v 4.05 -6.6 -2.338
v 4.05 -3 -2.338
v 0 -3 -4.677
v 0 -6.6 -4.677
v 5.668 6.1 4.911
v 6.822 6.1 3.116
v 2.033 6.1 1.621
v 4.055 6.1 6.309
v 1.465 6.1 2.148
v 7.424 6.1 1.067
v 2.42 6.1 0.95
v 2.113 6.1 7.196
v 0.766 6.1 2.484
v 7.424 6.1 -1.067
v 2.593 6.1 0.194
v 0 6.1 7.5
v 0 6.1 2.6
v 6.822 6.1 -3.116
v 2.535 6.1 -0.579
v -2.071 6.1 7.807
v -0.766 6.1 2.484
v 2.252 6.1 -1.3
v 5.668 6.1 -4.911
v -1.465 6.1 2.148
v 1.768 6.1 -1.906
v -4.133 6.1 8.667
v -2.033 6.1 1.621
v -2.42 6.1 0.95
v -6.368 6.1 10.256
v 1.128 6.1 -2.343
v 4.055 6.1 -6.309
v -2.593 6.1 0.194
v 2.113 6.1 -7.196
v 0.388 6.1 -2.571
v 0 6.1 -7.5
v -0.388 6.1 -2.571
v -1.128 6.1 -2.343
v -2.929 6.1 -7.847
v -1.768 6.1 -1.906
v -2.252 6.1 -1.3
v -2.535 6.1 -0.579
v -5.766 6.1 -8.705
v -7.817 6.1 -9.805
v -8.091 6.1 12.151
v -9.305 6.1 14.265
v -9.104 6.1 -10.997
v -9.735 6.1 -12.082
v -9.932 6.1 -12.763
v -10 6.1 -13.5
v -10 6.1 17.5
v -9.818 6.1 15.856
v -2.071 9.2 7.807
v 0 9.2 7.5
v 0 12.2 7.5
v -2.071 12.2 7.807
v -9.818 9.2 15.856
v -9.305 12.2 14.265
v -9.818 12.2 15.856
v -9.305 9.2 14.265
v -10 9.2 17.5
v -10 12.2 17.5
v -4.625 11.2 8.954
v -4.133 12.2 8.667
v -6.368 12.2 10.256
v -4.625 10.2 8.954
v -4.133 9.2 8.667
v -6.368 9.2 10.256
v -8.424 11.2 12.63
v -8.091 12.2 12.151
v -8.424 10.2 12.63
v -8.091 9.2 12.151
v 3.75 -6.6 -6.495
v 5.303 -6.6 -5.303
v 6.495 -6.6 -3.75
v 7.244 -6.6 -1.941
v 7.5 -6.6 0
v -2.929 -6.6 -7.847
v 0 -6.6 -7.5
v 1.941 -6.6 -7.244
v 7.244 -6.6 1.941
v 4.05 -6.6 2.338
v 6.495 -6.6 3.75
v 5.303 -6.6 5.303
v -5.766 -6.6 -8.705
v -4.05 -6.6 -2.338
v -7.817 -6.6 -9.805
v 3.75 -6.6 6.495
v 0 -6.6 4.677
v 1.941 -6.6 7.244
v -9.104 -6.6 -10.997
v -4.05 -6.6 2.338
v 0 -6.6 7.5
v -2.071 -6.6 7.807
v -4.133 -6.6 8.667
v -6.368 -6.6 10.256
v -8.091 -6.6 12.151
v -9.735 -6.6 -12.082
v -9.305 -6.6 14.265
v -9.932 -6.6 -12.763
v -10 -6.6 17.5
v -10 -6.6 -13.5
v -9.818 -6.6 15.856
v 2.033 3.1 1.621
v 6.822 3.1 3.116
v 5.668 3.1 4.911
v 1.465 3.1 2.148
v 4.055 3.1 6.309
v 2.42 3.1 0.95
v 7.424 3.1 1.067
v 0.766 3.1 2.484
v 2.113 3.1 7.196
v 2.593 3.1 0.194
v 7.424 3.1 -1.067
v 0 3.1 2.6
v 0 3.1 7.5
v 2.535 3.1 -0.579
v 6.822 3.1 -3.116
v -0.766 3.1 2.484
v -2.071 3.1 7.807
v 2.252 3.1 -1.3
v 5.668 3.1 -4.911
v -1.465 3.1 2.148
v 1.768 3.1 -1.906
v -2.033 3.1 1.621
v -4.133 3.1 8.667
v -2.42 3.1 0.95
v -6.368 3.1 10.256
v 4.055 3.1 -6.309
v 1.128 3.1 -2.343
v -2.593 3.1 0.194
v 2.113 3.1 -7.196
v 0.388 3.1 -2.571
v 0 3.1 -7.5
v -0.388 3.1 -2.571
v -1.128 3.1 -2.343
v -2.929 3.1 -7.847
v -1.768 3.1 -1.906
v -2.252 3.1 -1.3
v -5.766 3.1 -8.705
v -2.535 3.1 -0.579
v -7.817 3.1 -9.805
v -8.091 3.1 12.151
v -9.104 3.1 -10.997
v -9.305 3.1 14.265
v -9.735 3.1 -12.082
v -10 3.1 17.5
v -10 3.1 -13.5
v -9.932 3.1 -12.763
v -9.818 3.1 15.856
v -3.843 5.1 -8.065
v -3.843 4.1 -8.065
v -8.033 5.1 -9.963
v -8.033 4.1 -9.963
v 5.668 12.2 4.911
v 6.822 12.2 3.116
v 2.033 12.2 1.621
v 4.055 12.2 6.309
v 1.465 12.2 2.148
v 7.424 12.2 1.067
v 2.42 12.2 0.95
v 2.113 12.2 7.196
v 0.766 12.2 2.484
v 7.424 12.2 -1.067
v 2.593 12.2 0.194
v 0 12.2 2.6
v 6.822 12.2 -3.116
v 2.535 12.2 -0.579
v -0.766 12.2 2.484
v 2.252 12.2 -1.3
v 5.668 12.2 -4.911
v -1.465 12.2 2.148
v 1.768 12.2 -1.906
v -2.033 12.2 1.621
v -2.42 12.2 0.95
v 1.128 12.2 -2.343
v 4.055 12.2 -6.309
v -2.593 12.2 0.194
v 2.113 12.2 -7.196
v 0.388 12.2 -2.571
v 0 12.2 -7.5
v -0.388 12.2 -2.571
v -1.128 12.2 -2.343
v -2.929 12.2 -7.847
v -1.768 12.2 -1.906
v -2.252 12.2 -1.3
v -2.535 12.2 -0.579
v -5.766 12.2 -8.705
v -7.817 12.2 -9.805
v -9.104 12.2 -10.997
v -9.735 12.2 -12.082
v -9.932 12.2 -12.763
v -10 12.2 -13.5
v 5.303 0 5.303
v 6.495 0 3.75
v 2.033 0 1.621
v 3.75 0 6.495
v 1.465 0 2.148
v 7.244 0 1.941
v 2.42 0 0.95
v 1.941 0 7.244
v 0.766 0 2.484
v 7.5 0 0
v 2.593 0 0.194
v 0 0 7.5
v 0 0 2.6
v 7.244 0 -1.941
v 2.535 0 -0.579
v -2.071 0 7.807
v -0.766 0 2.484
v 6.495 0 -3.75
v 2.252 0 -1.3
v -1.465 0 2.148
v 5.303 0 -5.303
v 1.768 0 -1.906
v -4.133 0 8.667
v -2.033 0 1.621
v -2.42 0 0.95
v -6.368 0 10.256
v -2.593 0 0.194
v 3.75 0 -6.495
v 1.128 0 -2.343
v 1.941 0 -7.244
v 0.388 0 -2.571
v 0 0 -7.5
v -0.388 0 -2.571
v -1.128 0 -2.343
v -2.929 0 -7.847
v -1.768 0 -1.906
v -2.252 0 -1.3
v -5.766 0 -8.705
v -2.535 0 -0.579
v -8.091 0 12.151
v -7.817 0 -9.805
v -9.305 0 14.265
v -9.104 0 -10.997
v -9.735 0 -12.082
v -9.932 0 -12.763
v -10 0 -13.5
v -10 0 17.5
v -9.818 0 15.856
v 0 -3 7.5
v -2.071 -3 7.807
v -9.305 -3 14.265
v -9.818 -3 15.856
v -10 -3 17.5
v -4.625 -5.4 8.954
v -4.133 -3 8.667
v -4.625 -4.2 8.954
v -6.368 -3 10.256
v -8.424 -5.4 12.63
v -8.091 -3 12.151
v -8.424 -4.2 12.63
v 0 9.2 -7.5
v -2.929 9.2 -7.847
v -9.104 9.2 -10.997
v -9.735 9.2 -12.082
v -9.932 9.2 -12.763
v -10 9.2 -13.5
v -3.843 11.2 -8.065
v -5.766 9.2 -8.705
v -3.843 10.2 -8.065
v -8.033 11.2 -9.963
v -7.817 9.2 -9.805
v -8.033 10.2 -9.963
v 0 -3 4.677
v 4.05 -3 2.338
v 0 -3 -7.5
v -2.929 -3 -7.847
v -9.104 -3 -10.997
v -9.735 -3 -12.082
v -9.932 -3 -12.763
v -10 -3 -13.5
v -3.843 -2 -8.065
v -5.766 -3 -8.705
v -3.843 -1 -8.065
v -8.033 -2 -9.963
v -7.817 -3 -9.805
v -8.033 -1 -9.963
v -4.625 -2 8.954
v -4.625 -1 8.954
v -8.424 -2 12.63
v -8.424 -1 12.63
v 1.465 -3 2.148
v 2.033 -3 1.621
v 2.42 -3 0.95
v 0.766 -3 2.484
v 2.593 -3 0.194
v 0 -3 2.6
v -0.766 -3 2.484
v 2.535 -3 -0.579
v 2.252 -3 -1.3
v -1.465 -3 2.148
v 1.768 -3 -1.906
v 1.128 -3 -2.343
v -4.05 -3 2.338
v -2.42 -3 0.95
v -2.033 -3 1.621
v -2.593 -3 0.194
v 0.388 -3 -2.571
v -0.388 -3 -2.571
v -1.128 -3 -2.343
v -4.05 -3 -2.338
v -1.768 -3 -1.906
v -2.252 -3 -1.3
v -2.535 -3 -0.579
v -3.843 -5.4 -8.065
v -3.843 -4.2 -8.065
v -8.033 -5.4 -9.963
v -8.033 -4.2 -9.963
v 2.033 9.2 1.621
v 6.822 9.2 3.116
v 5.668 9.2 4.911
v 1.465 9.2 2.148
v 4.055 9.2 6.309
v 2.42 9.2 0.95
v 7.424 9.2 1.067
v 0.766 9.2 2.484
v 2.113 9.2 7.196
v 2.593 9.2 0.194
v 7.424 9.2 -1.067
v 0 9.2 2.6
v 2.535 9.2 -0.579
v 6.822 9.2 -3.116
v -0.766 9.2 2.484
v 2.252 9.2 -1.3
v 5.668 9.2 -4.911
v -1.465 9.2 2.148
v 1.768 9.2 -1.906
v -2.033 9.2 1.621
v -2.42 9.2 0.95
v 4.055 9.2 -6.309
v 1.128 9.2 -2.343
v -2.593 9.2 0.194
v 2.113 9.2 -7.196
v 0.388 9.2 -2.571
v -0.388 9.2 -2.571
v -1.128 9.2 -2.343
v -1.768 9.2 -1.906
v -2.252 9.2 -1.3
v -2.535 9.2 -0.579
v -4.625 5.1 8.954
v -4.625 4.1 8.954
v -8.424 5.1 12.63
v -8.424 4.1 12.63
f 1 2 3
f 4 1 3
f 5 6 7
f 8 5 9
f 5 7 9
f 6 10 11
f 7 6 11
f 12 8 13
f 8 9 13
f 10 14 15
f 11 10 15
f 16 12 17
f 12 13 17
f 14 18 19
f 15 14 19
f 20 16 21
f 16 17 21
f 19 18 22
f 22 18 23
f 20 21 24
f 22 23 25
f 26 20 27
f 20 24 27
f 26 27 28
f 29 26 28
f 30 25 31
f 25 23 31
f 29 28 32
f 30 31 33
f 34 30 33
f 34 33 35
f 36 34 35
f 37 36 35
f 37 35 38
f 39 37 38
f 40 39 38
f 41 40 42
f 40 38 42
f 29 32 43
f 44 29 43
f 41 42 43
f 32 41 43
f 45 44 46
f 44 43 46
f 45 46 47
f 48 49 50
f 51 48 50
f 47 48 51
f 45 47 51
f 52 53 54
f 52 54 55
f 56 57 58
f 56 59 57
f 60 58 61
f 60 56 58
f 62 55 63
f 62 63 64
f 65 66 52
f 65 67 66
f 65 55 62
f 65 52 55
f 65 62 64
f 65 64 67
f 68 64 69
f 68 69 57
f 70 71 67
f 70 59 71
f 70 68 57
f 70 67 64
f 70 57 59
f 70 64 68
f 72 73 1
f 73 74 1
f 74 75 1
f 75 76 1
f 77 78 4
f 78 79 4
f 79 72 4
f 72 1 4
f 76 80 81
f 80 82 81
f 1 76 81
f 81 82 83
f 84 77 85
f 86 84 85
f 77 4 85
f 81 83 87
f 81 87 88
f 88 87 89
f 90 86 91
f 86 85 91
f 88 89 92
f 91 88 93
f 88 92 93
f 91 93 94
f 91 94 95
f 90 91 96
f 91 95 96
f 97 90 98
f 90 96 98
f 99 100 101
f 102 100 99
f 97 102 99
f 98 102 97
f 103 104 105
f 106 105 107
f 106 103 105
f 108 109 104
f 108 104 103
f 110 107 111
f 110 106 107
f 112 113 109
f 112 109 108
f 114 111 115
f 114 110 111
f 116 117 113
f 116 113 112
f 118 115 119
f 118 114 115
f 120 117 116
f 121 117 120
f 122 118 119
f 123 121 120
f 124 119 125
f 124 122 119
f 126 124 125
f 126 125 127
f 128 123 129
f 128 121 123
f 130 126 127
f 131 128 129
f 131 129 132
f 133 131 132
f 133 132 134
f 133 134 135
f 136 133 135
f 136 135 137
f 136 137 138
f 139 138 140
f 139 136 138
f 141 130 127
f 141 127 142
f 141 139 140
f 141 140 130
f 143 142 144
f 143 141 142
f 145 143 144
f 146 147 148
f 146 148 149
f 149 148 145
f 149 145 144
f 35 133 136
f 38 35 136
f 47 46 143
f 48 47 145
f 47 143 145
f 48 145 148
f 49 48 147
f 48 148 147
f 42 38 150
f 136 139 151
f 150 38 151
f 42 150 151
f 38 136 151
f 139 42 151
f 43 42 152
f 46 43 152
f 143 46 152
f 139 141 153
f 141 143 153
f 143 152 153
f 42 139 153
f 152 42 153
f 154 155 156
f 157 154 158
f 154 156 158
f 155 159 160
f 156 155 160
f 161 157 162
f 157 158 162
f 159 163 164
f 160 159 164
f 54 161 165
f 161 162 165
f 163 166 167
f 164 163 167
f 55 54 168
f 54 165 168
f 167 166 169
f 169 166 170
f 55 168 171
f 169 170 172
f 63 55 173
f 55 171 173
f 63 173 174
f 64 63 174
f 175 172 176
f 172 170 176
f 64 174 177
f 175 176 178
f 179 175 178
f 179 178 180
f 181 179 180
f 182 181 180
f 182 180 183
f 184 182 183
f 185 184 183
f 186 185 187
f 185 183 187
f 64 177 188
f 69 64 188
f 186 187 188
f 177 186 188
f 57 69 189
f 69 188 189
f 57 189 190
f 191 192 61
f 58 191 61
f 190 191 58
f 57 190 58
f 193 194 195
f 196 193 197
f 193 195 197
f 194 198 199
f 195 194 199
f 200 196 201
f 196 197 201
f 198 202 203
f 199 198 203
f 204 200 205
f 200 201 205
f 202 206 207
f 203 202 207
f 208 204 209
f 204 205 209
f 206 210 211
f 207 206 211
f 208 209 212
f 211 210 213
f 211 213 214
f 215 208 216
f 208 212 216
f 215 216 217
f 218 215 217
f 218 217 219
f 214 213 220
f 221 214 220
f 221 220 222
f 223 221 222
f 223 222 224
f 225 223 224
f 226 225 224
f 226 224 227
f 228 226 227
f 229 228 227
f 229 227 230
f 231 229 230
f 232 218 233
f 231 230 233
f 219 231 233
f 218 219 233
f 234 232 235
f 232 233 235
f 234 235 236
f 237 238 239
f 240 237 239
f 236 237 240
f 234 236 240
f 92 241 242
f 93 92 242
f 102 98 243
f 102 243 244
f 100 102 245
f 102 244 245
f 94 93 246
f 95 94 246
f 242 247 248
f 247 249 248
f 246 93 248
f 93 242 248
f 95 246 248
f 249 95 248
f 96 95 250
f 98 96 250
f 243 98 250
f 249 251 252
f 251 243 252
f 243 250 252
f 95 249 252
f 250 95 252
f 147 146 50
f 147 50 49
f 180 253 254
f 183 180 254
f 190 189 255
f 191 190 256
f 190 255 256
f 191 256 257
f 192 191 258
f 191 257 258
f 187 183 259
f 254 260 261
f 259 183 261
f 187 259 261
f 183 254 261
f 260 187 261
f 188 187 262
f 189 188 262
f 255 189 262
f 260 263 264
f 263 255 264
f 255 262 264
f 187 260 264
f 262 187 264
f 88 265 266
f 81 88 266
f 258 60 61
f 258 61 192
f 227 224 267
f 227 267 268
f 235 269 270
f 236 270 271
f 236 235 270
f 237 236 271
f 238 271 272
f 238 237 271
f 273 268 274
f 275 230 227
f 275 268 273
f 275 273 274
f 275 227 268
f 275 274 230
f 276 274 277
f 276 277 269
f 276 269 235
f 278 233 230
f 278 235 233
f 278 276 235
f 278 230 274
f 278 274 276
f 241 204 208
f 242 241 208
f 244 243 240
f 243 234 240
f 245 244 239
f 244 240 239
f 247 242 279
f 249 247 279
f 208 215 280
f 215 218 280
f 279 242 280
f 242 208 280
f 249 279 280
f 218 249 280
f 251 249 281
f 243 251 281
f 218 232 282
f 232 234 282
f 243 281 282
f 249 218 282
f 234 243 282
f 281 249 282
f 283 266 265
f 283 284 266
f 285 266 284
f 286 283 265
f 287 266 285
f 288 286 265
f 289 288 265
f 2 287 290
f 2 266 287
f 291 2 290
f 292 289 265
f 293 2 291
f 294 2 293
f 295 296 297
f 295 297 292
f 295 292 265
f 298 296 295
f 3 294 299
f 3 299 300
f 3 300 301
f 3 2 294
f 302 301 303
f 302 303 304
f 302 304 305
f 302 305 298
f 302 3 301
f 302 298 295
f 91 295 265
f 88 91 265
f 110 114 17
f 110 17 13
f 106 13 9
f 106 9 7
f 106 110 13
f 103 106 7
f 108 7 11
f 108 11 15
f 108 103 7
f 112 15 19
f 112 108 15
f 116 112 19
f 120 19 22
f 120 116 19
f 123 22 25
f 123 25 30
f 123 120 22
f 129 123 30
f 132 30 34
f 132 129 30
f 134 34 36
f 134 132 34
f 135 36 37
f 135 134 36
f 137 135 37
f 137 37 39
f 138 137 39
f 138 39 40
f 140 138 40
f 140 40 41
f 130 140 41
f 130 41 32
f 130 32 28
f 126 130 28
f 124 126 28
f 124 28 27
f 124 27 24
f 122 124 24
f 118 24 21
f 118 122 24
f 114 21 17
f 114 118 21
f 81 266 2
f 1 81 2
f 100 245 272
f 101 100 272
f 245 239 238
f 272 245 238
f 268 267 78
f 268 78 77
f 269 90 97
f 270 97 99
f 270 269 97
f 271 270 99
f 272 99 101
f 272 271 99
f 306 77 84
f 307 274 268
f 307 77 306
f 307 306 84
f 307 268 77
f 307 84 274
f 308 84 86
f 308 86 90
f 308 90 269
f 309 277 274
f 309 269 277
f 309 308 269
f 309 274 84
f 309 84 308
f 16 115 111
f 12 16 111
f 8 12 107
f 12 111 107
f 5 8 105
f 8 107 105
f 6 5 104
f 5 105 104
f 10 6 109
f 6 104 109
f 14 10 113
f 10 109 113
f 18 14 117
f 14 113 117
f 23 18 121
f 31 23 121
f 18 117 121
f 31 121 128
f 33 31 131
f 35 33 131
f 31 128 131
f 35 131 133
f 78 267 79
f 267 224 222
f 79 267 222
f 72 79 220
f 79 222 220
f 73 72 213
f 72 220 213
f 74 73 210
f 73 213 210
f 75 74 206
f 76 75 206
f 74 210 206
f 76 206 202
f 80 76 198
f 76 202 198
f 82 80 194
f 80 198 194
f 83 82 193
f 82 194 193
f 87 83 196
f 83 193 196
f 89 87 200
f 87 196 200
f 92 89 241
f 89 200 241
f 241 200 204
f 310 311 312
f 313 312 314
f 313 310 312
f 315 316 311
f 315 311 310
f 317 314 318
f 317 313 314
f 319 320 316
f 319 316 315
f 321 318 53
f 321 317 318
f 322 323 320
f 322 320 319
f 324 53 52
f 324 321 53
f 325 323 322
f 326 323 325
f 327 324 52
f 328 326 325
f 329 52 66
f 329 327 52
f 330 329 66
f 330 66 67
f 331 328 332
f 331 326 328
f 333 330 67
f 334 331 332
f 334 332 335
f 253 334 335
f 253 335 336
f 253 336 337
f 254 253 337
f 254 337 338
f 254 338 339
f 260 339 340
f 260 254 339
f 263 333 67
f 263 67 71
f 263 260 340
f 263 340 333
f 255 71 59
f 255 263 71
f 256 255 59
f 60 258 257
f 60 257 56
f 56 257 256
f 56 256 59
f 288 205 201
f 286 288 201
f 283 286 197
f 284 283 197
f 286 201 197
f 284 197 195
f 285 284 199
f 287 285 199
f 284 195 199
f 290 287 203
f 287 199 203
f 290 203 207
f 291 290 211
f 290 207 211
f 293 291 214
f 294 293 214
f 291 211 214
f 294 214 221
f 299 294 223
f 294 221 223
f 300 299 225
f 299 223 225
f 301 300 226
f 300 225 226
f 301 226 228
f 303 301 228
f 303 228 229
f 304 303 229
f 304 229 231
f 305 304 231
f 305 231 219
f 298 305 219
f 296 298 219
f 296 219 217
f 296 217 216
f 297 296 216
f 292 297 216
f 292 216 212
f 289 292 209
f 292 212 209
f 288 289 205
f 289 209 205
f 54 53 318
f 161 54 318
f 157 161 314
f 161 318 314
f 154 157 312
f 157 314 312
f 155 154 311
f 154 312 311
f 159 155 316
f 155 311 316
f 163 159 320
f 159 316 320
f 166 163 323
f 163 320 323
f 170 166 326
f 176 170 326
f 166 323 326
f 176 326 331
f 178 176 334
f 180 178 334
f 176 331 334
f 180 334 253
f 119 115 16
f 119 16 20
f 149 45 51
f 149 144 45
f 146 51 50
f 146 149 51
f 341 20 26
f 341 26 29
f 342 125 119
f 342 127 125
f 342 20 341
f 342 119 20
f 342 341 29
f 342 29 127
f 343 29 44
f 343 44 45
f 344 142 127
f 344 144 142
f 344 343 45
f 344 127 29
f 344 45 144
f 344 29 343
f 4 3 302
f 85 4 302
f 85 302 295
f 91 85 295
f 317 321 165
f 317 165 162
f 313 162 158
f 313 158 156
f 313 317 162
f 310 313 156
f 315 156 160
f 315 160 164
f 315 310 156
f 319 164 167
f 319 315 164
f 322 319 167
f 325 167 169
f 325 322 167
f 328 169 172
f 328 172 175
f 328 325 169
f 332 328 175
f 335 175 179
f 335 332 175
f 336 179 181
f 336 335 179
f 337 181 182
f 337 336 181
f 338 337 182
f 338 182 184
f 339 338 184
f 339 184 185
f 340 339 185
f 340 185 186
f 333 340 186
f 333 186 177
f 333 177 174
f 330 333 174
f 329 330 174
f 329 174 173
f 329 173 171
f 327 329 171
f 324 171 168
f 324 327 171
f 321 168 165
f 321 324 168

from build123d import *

# Parameters (mm, degrees)
SKETCH1_R           = 2.6
BOSS_EXTRUDE1_DEPTH = 3
SKETCH2_R           = 7.5
SKETCH2_R_2         = 2.6
BOSS_EXTRUDE2_DEPTH = 3
SKETCH3_R           = 7.5
SKETCH3_R_2         = 2.6
BOSS_EXTRUDE3_DEPTH = 3
BOSS_EXTRUDE4_DEPTH = 3.6


with BuildPart() as part:
    # Sketch1 → Boss-Extrude1 (new body)
    # profile 1 of 4: a face of its own
    with BuildSketch(Plane(origin=(0, 0, 0), x_dir=(1, 0, 0), z_dir=(0, 1, 0))):
        with BuildLine():
            ThreePointArc((0, -7.5), (-7.5, 0), (0, 7.5))
            Line((0, 7.5), (-10, 7.5))
            Line((-10, 7.5), (-10, -7.5))
            Line((-10, -7.5), (0, -7.5))
        make_face()
    # profile 2 of 4: a face of its own
    with BuildSketch(Plane(origin=(0, 0, 0), x_dir=(1, 0, 0), z_dir=(0, 1, 0))):
        with BuildLine():
            ThreePointArc((7.5, 0), (5.303300859, 5.303300859), (0, 7.5))
            ThreePointArc((0, 7.5), (-7.5, 0), (0, -7.5))
            ThreePointArc((0, -7.5), (5.303300859, -5.303300859), (7.5, 0))
        make_face()
        with Locations(Location((0, 0, 0), (0, 0, 270))):
            Circle(SKETCH1_R, mode=Mode.SUBTRACT)
    # profile 3 of 4: a face of its own
    with BuildSketch(Plane(origin=(0, 0, 0), x_dir=(1, 0, 0), z_dir=(0, 1, 0))):
        with BuildLine():
            Line((-10, 7.5), (0, 7.5))
            add(Edge.make_bspline(
                [(0, 7.5), (-2.81326337, 7.5), (-10, 9.040913294), (-10, 13.5)],
                knots=[0, 0, 0, 0, 1, 1, 1, 1], degree=3))
            Line((-10, 13.5), (-10, 7.5))
        make_face()
    # profile 4 of 4: a face of its own
    with BuildSketch(Plane(origin=(0, 0, 0), x_dir=(1, 0, 0), z_dir=(0, 1, 0))):
        with BuildLine():
            add(Edge.make_bspline(
                [(0, -7.5), (-4.572694464, -7.5), (-10, -12.37583285), (-10, -17.5)],
                knots=[0, 0, 0, 0, 1, 1, 1, 1], degree=3))
            Line((0, -7.5), (-10, -7.5))
            Line((-10, -7.5), (-10, -17.5))
        make_face()
    extrude(amount=-BOSS_EXTRUDE1_DEPTH)

    # Sketch4 → Boss-Extrude4 (add)
    # profile 1 of 4: a face of its own
    with BuildSketch(Plane.XZ.offset(3)):
        with BuildLine():
            add(Edge.make_bspline(
                [(0, -7.5), (-2.81326337, -7.5), (-10, -9.040913294), (-10, -13.5)],
                knots=[0, 0, 0, 0, 1, 1, 1, 1], degree=3))
            Line((0, -7.5), (-10, -7.5))
            Line((-10, -7.5), (-10, -13.5))
        make_face()
    # profile 2 of 4: a face of its own
    with BuildSketch(Plane.XZ.offset(3)):
        with BuildLine():
            Line((-10, -7.5), (0, -7.5))
            ThreePointArc((0, -7.5), (-7.5, 0), (0, 7.5))
            Line((0, 7.5), (-10, 7.5))
            Line((-10, 7.5), (-10, -7.5))
        make_face()
    # profile 3 of 4: a face of its own
    with BuildSketch(Plane.XZ.offset(3)):
        with BuildLine():
            ThreePointArc((0, 7.5), (-7.5, 0), (0, -7.5))
            ThreePointArc((0, -7.5), (5.303300859, -5.303300859), (7.5, 0))
            ThreePointArc((7.5, 0), (5.303300859, 5.303300859), (0, 7.5))
        make_face()
        Polygon((0, 4.67653718), (4.05, 2.33826859), (4.05, -2.33826859), (0, -4.67653718), (-4.05, -2.33826859), (-4.05, 2.33826859), align=None, mode=Mode.SUBTRACT)
    # profile 4 of 4: a face of its own
    with BuildSketch(Plane.XZ.offset(3)):
        with BuildLine():
            Line((-10, 7.5), (0, 7.5))
            add(Edge.make_bspline(
                [(0, 7.5), (-4.572694464, 7.5), (-10, 12.37583285), (-10, 17.5)],
                knots=[0, 0, 0, 0, 1, 1, 1, 1], degree=3))
            Line((-10, 17.5), (-10, 7.5))
        make_face()
    extrude(amount=BOSS_EXTRUDE4_DEPTH)


with BuildPart() as body_2:
    # Sketch2 → Boss-Extrude2 (new body)
    # profile 1 of 4: a face of its own
    with BuildSketch(Plane(origin=(0, 3.1, 0), x_dir=(1, 0, 0), z_dir=(0, 1, 0))):
        with BuildLine():
            ThreePointArc((0, -7.5), (-7.5, 0), (0, 7.5))
            Line((0, 7.5), (-10, 7.5))
            Line((-10, 7.5), (-10, -7.5))
            Line((-10, -7.5), (0, -7.5))
        make_face()
    # profile 2 of 4: a face of its own
    with BuildSketch(Plane(origin=(0, 3.1, 0), x_dir=(1, 0, 0), z_dir=(0, 1, 0))):
        Circle(SKETCH2_R)
        with Locations(Location((0, 0, 0), (0, 0, 270))):
            Circle(SKETCH2_R_2, mode=Mode.SUBTRACT)
    # profile 3 of 4: a face of its own
    with BuildSketch(Plane(origin=(0, 3.1, 0), x_dir=(1, 0, 0), z_dir=(0, 1, 0))):
        with BuildLine():
            add(Edge.make_bspline(
                [(0, -7.5), (-4.572694464, -7.5), (-10, -12.37583285), (-10, -17.5)],
                knots=[0, 0, 0, 0, 1, 1, 1, 1], degree=3))
            Line((-10, -17.5), (-10, -7.5))
            Line((-10, -7.5), (0, -7.5))
        make_face()
    # profile 4 of 4: a face of its own
    with BuildSketch(Plane(origin=(0, 3.1, 0), x_dir=(1, 0, 0), z_dir=(0, 1, 0))):
        with BuildLine():
            Line((0, 7.5), (-10, 7.5))
            Line((-10, 7.5), (-10, 13.5))
            add(Edge.make_bspline(
                [(0, 7.5), (-2.81326337, 7.5), (-10, 9.040913294), (-10, 13.5)],
                knots=[0, 0, 0, 0, 1, 1, 1, 1], degree=3))
        make_face()
    extrude(amount=BOSS_EXTRUDE2_DEPTH)


with BuildPart() as body_3:
    # Sketch3 → Boss-Extrude3 (new body)
    # profile 1 of 4: a face of its own
    with BuildSketch(Plane(origin=(0, 9.2, 0), x_dir=(1, 0, 0), z_dir=(0, 1, 0))):
        with BuildLine():
            ThreePointArc((0, -7.5), (-7.5, 0), (0, 7.5))
            Line((0, 7.5), (-10, 7.5))
            Line((-10, 7.5), (-10, -7.5))
            Line((-10, -7.5), (0, -7.5))
        make_face()
    # profile 2 of 4: a face of its own
    with BuildSketch(Plane(origin=(0, 9.2, 0), x_dir=(1, 0, 0), z_dir=(0, 1, 0))):
        Circle(SKETCH3_R)
        with Locations(Location((0, 0, 0), (0, 0, 270))):
            Circle(SKETCH3_R_2, mode=Mode.SUBTRACT)
    # profile 3 of 4: a face of its own
    with BuildSketch(Plane(origin=(0, 9.2, 0), x_dir=(1, 0, 0), z_dir=(0, 1, 0))):
        with BuildLine():
            add(Edge.make_bspline(
                [(0, -7.5), (-4.572694464, -7.5), (-10, -12.37583285), (-10, -17.5)],
                knots=[0, 0, 0, 0, 1, 1, 1, 1], degree=3))
            Line((-10, -17.5), (-10, -7.5))
            Line((-10, -7.5), (0, -7.5))
        make_face()
    # profile 4 of 4: a face of its own
    with BuildSketch(Plane(origin=(0, 9.2, 0), x_dir=(1, 0, 0), z_dir=(0, 1, 0))):
        with BuildLine():
            Line((0, 7.5), (-10, 7.5))
            Line((-10, 7.5), (-10, 13.5))
            add(Edge.make_bspline(
                [(0, 7.5), (-2.81326337, 7.5), (-10, 9.040913294), (-10, 13.5)],
                knots=[0, 0, 0, 0, 1, 1, 1, 1], degree=3))
        make_face()
    extrude(amount=BOSS_EXTRUDE3_DEPTH)


solid = Compound([part.part, body_2.part, body_3.part])
